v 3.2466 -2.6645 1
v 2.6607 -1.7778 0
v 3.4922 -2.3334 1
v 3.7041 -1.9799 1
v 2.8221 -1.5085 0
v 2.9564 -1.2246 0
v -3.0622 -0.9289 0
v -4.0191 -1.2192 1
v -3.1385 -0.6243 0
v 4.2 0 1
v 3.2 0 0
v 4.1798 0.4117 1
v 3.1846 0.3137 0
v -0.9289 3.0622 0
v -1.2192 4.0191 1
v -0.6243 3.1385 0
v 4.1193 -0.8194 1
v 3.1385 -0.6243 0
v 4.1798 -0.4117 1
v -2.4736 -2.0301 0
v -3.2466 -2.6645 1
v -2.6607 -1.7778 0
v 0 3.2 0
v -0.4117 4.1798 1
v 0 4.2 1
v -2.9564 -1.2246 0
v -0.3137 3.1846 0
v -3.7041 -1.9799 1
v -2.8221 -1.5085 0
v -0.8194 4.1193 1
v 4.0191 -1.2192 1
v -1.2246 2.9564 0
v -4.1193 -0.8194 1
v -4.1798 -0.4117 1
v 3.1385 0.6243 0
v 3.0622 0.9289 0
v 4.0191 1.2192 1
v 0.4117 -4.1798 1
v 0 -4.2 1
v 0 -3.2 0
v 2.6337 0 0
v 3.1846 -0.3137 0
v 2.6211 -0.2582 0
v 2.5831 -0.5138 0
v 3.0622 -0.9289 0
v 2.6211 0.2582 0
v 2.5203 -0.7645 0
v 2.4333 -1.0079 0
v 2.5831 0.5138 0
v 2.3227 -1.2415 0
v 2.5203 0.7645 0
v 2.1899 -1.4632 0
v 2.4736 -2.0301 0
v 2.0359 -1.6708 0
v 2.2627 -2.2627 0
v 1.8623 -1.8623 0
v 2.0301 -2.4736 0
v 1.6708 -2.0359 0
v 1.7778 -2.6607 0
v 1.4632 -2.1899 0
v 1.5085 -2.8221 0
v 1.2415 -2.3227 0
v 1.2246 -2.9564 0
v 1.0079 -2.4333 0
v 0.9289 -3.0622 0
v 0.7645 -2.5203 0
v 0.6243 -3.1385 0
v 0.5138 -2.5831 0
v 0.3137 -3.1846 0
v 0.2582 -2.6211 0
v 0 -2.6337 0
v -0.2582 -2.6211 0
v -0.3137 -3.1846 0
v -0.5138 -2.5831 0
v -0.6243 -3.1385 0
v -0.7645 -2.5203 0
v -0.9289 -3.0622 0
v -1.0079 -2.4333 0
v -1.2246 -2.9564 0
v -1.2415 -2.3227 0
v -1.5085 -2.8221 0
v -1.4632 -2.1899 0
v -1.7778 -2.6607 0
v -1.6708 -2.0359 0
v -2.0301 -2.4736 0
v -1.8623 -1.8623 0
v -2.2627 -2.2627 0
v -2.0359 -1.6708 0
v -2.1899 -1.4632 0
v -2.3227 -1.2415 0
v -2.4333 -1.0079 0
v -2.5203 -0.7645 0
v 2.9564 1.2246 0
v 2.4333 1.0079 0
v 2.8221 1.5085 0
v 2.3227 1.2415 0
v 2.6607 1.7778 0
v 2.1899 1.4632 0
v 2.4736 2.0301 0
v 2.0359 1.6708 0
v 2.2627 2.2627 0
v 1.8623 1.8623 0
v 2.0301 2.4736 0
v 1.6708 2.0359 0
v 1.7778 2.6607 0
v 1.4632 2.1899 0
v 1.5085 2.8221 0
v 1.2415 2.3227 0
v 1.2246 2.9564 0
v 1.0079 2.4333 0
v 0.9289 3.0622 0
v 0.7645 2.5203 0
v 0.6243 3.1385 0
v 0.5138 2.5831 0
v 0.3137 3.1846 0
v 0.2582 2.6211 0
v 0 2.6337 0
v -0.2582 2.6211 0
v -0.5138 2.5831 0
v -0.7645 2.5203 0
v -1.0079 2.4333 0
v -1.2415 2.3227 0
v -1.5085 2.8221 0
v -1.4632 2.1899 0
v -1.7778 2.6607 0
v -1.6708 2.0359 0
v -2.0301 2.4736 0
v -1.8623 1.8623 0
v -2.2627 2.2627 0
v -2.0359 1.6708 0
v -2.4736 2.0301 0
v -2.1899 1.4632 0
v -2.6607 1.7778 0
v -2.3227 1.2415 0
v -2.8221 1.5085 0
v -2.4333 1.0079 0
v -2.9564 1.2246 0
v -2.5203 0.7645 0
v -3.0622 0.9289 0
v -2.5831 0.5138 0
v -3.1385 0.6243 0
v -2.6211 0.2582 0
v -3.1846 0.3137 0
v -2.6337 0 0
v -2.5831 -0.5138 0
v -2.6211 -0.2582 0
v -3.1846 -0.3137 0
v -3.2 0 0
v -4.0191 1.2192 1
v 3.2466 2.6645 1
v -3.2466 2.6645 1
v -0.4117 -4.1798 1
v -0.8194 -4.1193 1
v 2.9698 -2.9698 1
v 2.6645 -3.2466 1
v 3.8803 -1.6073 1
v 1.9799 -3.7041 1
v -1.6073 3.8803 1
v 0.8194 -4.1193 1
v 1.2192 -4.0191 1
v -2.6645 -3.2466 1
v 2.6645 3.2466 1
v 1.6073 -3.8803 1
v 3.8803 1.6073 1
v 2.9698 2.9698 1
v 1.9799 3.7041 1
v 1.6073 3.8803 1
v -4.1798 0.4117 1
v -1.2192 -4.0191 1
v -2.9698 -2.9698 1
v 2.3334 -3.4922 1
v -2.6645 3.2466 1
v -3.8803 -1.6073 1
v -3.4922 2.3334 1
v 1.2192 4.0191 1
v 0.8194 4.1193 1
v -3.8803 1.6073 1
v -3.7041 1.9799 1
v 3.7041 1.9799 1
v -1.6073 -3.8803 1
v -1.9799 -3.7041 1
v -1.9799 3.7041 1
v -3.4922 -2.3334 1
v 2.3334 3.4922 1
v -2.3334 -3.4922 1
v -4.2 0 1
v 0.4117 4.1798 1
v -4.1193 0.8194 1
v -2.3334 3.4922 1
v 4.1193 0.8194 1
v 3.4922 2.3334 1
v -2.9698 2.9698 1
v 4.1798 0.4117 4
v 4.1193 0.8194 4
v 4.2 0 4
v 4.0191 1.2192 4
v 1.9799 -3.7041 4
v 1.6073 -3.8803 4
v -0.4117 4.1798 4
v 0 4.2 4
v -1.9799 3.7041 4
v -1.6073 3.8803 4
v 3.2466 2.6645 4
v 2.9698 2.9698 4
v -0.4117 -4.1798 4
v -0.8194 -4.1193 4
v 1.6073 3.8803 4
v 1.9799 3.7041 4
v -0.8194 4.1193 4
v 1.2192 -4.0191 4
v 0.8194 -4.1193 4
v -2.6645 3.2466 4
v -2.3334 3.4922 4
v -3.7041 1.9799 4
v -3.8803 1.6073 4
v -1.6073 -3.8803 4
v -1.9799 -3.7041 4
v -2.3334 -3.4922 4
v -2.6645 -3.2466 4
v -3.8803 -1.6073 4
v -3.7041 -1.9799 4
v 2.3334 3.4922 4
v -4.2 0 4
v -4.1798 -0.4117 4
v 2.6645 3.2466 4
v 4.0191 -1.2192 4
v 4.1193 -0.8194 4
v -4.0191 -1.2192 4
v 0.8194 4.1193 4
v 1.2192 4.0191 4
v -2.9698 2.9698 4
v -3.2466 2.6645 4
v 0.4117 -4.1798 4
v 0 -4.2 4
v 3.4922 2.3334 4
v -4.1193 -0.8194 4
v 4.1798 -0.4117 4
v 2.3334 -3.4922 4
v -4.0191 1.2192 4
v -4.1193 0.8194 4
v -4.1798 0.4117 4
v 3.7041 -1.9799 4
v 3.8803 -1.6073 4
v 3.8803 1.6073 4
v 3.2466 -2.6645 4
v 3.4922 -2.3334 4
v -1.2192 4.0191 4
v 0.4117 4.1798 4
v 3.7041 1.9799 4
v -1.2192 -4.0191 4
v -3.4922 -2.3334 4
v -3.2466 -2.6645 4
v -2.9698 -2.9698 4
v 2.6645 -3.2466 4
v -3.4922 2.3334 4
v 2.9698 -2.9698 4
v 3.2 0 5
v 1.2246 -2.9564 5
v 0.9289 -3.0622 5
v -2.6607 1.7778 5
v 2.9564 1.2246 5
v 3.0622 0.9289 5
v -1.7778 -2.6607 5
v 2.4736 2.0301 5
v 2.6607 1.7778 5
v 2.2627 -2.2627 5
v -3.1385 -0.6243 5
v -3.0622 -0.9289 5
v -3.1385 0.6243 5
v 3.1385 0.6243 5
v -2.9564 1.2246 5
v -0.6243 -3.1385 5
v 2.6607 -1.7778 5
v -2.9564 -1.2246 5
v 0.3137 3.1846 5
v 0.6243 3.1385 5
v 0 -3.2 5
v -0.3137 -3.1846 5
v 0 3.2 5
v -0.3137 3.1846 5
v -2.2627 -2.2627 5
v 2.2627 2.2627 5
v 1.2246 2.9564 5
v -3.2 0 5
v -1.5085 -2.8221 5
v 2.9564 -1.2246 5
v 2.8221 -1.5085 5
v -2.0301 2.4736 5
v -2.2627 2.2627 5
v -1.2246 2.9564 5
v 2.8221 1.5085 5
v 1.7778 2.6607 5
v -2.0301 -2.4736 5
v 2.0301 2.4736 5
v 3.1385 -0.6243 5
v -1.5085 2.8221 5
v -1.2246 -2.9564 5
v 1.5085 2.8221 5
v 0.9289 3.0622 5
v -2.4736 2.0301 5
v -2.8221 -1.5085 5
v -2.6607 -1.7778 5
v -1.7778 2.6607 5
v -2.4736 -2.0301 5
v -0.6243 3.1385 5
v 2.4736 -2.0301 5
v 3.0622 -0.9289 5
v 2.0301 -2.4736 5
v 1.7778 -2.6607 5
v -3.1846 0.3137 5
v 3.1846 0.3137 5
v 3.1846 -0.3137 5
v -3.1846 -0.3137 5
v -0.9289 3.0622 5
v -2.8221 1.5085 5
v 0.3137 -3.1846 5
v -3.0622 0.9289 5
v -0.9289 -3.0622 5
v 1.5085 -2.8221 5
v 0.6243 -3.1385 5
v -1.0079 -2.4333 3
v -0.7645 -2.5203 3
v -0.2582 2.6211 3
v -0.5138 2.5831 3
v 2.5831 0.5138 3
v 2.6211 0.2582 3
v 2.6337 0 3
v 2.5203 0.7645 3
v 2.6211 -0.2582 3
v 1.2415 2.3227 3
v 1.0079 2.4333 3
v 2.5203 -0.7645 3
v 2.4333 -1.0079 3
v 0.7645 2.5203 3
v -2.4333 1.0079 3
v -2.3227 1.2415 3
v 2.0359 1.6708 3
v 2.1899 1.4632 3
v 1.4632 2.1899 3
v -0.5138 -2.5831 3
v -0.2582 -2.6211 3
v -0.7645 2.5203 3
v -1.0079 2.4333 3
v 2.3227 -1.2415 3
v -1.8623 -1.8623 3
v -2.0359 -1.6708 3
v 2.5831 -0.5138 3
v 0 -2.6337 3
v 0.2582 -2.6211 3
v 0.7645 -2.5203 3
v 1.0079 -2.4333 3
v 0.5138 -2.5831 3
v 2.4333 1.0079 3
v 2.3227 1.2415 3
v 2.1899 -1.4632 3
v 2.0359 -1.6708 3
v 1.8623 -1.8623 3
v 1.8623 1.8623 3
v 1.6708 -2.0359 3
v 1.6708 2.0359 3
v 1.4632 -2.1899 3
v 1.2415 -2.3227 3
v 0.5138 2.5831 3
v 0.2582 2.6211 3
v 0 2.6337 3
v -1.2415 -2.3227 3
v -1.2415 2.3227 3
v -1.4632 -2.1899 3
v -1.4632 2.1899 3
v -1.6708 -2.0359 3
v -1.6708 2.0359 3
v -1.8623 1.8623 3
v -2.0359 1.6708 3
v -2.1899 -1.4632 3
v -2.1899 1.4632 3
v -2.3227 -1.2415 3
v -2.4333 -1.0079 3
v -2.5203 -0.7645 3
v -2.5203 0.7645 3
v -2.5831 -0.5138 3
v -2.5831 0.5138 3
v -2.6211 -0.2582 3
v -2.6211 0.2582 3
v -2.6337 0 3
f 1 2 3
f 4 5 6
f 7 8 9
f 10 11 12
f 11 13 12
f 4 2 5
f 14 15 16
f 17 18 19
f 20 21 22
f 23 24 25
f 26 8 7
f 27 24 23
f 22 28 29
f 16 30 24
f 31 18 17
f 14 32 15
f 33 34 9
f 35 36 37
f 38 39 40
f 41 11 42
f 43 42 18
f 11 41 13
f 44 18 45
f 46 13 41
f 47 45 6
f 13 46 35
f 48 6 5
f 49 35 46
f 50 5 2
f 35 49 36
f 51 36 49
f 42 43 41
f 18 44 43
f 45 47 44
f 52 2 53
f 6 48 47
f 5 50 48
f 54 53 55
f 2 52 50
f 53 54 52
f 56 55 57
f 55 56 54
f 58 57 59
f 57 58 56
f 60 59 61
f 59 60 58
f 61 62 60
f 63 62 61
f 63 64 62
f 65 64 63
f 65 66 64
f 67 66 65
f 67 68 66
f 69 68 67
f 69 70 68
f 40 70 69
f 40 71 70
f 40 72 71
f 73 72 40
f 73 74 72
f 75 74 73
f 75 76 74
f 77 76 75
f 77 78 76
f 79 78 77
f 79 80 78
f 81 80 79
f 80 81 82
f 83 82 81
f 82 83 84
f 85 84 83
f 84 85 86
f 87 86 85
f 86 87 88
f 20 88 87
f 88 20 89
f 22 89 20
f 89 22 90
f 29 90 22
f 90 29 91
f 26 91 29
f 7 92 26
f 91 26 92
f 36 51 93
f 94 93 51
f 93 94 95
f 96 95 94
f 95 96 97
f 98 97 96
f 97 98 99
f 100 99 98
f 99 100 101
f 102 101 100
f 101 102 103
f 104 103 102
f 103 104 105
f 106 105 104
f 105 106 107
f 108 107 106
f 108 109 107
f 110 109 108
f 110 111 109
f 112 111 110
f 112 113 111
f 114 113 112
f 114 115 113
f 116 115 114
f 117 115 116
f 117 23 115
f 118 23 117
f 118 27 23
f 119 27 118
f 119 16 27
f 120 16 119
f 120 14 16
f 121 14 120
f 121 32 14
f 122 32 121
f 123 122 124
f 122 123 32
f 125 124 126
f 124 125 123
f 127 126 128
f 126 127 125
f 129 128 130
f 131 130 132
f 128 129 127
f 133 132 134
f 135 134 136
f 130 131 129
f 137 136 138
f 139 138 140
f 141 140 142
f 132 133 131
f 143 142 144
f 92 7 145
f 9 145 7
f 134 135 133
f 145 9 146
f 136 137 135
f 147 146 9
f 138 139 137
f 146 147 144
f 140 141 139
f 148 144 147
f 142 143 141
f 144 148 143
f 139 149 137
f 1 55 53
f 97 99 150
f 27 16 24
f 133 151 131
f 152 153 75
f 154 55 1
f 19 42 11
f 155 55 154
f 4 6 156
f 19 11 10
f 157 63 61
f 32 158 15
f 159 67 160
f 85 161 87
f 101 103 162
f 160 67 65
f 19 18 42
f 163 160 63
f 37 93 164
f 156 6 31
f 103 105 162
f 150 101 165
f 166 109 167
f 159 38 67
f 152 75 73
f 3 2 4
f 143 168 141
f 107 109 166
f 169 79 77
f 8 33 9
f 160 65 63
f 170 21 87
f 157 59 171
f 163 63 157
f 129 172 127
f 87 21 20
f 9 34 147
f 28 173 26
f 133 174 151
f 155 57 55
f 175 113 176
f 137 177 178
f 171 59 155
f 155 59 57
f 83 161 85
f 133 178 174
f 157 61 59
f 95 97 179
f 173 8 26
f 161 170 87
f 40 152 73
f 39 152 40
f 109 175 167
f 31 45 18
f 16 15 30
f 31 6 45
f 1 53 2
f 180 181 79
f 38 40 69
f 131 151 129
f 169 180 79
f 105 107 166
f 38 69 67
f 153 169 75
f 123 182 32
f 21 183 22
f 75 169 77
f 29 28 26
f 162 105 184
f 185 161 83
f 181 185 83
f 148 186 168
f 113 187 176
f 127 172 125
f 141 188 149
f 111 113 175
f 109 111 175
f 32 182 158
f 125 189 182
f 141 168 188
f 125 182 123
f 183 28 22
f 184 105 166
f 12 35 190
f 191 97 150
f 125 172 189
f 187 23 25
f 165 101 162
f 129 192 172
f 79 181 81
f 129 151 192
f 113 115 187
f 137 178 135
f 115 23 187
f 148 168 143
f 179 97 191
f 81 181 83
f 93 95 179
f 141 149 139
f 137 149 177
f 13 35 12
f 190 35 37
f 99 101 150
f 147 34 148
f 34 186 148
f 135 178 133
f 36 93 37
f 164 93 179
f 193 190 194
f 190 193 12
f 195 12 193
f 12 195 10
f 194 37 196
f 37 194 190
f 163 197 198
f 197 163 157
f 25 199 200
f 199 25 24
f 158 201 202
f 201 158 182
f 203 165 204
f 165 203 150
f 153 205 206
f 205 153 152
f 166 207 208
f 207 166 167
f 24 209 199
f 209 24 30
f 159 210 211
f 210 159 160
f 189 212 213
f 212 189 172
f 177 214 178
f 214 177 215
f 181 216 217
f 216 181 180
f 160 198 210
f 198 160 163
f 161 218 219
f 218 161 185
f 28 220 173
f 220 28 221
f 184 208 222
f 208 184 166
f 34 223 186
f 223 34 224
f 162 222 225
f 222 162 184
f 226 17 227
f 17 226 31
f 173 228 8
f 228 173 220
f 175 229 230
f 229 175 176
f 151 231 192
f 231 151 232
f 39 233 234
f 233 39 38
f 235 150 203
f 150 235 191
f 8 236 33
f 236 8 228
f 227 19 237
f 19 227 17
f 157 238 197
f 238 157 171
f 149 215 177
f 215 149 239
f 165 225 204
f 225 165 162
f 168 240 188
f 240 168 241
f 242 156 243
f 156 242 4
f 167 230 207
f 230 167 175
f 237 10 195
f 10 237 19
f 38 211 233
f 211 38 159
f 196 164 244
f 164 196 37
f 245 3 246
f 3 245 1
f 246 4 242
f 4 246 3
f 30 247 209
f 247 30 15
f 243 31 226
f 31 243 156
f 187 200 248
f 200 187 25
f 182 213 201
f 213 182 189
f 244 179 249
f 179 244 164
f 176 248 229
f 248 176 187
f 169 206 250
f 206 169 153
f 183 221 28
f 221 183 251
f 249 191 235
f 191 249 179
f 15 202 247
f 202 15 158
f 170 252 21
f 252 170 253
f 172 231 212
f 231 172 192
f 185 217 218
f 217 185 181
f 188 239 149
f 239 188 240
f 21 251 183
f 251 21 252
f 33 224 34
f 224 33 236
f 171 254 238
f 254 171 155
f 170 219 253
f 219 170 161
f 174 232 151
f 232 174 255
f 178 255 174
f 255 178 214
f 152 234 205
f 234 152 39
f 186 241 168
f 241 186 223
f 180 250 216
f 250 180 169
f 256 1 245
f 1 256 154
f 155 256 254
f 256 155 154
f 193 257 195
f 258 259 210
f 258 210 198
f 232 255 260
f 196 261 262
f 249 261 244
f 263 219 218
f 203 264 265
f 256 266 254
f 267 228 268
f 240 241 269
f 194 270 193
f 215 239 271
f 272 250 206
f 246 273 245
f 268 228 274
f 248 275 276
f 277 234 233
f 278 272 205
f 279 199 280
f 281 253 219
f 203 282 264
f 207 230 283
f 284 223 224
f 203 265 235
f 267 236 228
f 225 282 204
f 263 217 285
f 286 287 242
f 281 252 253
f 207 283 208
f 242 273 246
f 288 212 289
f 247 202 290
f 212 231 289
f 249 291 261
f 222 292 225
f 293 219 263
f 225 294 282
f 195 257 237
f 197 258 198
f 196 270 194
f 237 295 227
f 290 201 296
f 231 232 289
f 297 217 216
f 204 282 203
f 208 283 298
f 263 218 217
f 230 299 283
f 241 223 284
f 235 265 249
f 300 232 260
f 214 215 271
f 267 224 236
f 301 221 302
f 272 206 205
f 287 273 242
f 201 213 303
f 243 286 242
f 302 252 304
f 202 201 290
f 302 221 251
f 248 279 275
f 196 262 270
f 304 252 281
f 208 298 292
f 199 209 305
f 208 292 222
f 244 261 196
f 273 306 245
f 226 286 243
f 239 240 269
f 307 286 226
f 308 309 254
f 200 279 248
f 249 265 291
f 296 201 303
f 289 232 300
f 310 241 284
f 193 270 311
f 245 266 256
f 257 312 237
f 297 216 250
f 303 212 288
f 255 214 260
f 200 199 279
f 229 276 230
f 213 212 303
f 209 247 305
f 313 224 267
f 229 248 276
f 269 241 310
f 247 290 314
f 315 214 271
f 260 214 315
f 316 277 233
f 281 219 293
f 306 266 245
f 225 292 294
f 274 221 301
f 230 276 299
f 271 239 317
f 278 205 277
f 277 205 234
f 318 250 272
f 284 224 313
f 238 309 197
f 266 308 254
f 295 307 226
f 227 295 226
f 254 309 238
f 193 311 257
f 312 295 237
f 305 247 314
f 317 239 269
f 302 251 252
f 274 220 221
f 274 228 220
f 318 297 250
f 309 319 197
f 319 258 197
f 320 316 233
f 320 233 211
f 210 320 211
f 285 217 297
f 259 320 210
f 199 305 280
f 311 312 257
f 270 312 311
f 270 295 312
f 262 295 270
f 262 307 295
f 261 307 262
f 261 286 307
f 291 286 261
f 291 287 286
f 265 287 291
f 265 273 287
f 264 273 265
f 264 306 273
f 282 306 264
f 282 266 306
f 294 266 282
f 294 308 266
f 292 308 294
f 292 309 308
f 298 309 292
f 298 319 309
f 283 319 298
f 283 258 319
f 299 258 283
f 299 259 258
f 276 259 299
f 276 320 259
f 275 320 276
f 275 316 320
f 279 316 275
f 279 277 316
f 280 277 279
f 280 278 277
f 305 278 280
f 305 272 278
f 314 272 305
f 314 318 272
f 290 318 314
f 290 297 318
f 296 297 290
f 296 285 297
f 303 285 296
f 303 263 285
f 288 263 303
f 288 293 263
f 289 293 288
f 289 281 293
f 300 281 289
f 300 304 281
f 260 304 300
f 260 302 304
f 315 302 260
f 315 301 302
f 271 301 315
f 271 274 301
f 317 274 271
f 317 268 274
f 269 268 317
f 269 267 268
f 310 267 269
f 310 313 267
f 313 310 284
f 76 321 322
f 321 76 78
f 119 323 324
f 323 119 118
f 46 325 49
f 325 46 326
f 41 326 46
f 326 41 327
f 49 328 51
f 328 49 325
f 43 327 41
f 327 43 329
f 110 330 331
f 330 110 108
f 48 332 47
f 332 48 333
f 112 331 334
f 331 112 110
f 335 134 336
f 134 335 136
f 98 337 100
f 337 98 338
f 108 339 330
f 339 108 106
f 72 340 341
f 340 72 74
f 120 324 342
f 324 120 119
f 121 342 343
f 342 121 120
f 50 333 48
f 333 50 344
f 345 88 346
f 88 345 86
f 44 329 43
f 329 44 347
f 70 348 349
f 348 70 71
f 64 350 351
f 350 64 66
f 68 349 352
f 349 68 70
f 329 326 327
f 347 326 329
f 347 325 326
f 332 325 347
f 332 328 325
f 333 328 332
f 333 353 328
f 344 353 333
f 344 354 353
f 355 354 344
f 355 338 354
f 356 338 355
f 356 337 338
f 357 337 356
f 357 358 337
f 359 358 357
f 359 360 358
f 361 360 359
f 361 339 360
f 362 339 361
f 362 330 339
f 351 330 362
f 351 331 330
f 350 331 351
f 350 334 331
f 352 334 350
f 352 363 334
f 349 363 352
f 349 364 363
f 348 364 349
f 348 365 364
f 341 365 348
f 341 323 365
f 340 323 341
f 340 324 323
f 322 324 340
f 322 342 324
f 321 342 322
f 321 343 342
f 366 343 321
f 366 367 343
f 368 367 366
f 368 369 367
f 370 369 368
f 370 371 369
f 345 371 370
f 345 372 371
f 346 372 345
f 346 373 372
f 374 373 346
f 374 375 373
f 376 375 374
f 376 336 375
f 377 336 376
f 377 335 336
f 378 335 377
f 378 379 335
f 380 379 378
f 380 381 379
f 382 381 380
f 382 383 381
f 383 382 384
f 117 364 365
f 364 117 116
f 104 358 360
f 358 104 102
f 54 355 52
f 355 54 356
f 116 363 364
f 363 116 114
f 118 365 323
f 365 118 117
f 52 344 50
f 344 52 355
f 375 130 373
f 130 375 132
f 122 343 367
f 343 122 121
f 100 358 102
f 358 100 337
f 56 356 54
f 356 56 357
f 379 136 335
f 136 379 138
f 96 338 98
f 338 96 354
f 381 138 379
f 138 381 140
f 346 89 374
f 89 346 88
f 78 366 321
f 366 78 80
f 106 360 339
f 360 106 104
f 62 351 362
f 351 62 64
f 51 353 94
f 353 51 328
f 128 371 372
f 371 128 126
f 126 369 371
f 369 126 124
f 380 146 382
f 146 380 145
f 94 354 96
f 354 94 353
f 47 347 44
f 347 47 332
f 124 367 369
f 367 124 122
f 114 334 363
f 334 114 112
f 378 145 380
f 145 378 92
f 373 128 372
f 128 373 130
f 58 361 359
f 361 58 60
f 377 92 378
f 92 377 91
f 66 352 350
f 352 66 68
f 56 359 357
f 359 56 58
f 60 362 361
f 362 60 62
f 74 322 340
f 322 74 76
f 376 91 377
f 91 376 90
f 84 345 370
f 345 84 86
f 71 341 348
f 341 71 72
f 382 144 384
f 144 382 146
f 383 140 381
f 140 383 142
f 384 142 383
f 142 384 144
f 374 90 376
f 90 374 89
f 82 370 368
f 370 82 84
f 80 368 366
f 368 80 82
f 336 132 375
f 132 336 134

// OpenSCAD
// Bolt-End-Cap.scad
// Version: v0.08
// Date: 2026-06-18
// Description: Parametric M6 Bolt End Cap for Wing-Foil tracks.
// Helps prevent the end of the M6 bolt from damaging the track box bottom.

// ========================
// PARAMETERS
// ========================

/* [Cap Dimensions] */
// Diameter of the round cap (8mm to fit perfectly in the track)
cap_diameter = 8.4;        // [5:15]
// Chamfer size on top/bottom outer edges to prevent catching inside the track
outer_chamfer = 1.0;     // [0:2]

/* [Thread Parameters] */
// Nominal thread diameter (M6 = 6)
thread_diameter = 6;     // [3:12]
// Thread pitch (M6 standard = 1.0)
thread_pitch = 1.0;      // [0.5:2.5]
// Depth of internal threads (3mm as requested)
thread_depth = 3.0;      // [2:10]
// Additional solid material thickness at the bottom (2mm as requested)
material_thickness = 2.0;// [1:10]

/* [3D Printing Adjustments] */
// Extra clearance on diameter for 3D printed threads to fit easily
clearance = 0.25;        // [0:1]

/* [Visualization] */
// Set to true to see a 50% cutaway of the internal threads
show_cross_section = false;

// ========================
// COMPUTED VALUES
// ========================
total_height = thread_depth + material_thickness;

// ========================
// MAIN ASSEMBLY
// ========================

module main() {
    if (show_cross_section) {
        difference() {
            bolt_cap();
            // Cut away the front-right quadrant to inspect threads
            translate([0, -cap_diameter, -1]) {
                cube([cap_diameter, cap_diameter * 2, total_height + 2]);
            }
        }
    } else {
        bolt_cap();
    }
}

module bolt_cap() {
    d_cleared = thread_diameter + clearance;
    R_max = d_cleared / 2;
    R_min = R_max - 0.541266 * thread_pitch;

    // Core cylinder is made slightly larger than R_min to overlap with the thread teeth,
    // which prevents coplanar surface errors in CGAL.
    R_core = R_min + 0.05;

    z_start = -1; // Extend below the bottom for clean cut

    // Total turns of the thread (from z_start to depth)
    turns = (thread_depth - z_start) / thread_pitch;
    S = round(turns * 64); // Total segments

    difference() {
        // Outer body of the cap: beautifully chamfered cylinder so it never catches
        chamfered_cylinder(cap_diameter, total_height, outer_chamfer);

        // 1. Subtract the core cylinder hole
        translate([0, 0, z_start]) {
            cylinder(h = thread_depth - z_start, r = R_core, $fn = 64);
        }

        // 2. Subtract the helical thread teeth (perfect manifold closed tube)
        // With corrected winding (CCW) on all 4 faces to ensure validity in CGAL.
        let (
            vertices = [
                for (s = [0 : S])
                    for (p = [0 : 3])
                        let (
                            theta = s * 360 / 64,
                            z_center = z_start + s * thread_pitch / 64,
                            c = cos(theta),
                            si = sin(theta),
                            r = (p == 1 || p == 2) ? R_max : R_min,
                            dz = (p == 0) ? thread_pitch * 7/16 :
                                 (p == 1) ? thread_pitch * 1/16 :
                                 (p == 2) ? -thread_pitch * 1/16 : -thread_pitch * 7/16
                        )
                        [ r * c, r * si, z_center + dz ]
            ],
            faces = concat(
                // Helical tube sides (triangulated and winding-corrected!)
                [
                    for (s = [0 : S-1])
                        for (p = [0 : 3])
                            let (
                                i0 = s * 4 + p,
                                i1 = s * 4 + (p + 1) % 4,
                                i2 = (s + 1) * 4 + (p + 1) % 4,
                                i3 = (s + 1) * 4 + p
                            )
                            if (p == 3)
                                each [ [ i1, i0, i3 ], [ i1, i3, i2 ] ]
                            else
                                each [ [ i0, i1, i2 ], [ i0, i2, i3 ] ]
                ],
                // Start cap (triangulated, s = 0) - corrected manifold winding!
                [
                    [ 1, 0, 3 ], [ 1, 3, 2 ]
                ],
                // End cap (triangulated, s = S)
                [
                    [ S * 4, S * 4 + 1, S * 4 + 2 ], [ S * 4, S * 4 + 2, S * 4 + 3 ]
                ]
            )
        ) {
            polyhedron(points = vertices, faces = faces, convexity = 10);
        }
    }
}

// ========================
// MODULES
// ========================

// Fast chamfered cylinder with parametric height and chamfer size
module chamfered_cylinder(d, h, c) {
    actual_c = min(c, min(d/4, h/2)); // Ensure chamfer size is geometrically valid
    if (actual_c <= 0) {
        cylinder(d = d, h = h, $fn = 64);
    } else {
        union() {
            // Bottom chamfer cone
            cylinder(h = actual_c, r1 = d/2 - actual_c, r2 = d/2, $fn = 64);
            // Middle cylinder body
            translate([0, 0, actual_c]) {
                cylinder(h = h - 2*actual_c, r = d/2, $fn = 64);
            }
            // Top chamfer cone
            translate([0, 0, h - actual_c]) {
                cylinder(h = actual_c, r1 = d/2, r2 = d/2 - actual_c, $fn = 64);
            }
        }
    }
}

main();
